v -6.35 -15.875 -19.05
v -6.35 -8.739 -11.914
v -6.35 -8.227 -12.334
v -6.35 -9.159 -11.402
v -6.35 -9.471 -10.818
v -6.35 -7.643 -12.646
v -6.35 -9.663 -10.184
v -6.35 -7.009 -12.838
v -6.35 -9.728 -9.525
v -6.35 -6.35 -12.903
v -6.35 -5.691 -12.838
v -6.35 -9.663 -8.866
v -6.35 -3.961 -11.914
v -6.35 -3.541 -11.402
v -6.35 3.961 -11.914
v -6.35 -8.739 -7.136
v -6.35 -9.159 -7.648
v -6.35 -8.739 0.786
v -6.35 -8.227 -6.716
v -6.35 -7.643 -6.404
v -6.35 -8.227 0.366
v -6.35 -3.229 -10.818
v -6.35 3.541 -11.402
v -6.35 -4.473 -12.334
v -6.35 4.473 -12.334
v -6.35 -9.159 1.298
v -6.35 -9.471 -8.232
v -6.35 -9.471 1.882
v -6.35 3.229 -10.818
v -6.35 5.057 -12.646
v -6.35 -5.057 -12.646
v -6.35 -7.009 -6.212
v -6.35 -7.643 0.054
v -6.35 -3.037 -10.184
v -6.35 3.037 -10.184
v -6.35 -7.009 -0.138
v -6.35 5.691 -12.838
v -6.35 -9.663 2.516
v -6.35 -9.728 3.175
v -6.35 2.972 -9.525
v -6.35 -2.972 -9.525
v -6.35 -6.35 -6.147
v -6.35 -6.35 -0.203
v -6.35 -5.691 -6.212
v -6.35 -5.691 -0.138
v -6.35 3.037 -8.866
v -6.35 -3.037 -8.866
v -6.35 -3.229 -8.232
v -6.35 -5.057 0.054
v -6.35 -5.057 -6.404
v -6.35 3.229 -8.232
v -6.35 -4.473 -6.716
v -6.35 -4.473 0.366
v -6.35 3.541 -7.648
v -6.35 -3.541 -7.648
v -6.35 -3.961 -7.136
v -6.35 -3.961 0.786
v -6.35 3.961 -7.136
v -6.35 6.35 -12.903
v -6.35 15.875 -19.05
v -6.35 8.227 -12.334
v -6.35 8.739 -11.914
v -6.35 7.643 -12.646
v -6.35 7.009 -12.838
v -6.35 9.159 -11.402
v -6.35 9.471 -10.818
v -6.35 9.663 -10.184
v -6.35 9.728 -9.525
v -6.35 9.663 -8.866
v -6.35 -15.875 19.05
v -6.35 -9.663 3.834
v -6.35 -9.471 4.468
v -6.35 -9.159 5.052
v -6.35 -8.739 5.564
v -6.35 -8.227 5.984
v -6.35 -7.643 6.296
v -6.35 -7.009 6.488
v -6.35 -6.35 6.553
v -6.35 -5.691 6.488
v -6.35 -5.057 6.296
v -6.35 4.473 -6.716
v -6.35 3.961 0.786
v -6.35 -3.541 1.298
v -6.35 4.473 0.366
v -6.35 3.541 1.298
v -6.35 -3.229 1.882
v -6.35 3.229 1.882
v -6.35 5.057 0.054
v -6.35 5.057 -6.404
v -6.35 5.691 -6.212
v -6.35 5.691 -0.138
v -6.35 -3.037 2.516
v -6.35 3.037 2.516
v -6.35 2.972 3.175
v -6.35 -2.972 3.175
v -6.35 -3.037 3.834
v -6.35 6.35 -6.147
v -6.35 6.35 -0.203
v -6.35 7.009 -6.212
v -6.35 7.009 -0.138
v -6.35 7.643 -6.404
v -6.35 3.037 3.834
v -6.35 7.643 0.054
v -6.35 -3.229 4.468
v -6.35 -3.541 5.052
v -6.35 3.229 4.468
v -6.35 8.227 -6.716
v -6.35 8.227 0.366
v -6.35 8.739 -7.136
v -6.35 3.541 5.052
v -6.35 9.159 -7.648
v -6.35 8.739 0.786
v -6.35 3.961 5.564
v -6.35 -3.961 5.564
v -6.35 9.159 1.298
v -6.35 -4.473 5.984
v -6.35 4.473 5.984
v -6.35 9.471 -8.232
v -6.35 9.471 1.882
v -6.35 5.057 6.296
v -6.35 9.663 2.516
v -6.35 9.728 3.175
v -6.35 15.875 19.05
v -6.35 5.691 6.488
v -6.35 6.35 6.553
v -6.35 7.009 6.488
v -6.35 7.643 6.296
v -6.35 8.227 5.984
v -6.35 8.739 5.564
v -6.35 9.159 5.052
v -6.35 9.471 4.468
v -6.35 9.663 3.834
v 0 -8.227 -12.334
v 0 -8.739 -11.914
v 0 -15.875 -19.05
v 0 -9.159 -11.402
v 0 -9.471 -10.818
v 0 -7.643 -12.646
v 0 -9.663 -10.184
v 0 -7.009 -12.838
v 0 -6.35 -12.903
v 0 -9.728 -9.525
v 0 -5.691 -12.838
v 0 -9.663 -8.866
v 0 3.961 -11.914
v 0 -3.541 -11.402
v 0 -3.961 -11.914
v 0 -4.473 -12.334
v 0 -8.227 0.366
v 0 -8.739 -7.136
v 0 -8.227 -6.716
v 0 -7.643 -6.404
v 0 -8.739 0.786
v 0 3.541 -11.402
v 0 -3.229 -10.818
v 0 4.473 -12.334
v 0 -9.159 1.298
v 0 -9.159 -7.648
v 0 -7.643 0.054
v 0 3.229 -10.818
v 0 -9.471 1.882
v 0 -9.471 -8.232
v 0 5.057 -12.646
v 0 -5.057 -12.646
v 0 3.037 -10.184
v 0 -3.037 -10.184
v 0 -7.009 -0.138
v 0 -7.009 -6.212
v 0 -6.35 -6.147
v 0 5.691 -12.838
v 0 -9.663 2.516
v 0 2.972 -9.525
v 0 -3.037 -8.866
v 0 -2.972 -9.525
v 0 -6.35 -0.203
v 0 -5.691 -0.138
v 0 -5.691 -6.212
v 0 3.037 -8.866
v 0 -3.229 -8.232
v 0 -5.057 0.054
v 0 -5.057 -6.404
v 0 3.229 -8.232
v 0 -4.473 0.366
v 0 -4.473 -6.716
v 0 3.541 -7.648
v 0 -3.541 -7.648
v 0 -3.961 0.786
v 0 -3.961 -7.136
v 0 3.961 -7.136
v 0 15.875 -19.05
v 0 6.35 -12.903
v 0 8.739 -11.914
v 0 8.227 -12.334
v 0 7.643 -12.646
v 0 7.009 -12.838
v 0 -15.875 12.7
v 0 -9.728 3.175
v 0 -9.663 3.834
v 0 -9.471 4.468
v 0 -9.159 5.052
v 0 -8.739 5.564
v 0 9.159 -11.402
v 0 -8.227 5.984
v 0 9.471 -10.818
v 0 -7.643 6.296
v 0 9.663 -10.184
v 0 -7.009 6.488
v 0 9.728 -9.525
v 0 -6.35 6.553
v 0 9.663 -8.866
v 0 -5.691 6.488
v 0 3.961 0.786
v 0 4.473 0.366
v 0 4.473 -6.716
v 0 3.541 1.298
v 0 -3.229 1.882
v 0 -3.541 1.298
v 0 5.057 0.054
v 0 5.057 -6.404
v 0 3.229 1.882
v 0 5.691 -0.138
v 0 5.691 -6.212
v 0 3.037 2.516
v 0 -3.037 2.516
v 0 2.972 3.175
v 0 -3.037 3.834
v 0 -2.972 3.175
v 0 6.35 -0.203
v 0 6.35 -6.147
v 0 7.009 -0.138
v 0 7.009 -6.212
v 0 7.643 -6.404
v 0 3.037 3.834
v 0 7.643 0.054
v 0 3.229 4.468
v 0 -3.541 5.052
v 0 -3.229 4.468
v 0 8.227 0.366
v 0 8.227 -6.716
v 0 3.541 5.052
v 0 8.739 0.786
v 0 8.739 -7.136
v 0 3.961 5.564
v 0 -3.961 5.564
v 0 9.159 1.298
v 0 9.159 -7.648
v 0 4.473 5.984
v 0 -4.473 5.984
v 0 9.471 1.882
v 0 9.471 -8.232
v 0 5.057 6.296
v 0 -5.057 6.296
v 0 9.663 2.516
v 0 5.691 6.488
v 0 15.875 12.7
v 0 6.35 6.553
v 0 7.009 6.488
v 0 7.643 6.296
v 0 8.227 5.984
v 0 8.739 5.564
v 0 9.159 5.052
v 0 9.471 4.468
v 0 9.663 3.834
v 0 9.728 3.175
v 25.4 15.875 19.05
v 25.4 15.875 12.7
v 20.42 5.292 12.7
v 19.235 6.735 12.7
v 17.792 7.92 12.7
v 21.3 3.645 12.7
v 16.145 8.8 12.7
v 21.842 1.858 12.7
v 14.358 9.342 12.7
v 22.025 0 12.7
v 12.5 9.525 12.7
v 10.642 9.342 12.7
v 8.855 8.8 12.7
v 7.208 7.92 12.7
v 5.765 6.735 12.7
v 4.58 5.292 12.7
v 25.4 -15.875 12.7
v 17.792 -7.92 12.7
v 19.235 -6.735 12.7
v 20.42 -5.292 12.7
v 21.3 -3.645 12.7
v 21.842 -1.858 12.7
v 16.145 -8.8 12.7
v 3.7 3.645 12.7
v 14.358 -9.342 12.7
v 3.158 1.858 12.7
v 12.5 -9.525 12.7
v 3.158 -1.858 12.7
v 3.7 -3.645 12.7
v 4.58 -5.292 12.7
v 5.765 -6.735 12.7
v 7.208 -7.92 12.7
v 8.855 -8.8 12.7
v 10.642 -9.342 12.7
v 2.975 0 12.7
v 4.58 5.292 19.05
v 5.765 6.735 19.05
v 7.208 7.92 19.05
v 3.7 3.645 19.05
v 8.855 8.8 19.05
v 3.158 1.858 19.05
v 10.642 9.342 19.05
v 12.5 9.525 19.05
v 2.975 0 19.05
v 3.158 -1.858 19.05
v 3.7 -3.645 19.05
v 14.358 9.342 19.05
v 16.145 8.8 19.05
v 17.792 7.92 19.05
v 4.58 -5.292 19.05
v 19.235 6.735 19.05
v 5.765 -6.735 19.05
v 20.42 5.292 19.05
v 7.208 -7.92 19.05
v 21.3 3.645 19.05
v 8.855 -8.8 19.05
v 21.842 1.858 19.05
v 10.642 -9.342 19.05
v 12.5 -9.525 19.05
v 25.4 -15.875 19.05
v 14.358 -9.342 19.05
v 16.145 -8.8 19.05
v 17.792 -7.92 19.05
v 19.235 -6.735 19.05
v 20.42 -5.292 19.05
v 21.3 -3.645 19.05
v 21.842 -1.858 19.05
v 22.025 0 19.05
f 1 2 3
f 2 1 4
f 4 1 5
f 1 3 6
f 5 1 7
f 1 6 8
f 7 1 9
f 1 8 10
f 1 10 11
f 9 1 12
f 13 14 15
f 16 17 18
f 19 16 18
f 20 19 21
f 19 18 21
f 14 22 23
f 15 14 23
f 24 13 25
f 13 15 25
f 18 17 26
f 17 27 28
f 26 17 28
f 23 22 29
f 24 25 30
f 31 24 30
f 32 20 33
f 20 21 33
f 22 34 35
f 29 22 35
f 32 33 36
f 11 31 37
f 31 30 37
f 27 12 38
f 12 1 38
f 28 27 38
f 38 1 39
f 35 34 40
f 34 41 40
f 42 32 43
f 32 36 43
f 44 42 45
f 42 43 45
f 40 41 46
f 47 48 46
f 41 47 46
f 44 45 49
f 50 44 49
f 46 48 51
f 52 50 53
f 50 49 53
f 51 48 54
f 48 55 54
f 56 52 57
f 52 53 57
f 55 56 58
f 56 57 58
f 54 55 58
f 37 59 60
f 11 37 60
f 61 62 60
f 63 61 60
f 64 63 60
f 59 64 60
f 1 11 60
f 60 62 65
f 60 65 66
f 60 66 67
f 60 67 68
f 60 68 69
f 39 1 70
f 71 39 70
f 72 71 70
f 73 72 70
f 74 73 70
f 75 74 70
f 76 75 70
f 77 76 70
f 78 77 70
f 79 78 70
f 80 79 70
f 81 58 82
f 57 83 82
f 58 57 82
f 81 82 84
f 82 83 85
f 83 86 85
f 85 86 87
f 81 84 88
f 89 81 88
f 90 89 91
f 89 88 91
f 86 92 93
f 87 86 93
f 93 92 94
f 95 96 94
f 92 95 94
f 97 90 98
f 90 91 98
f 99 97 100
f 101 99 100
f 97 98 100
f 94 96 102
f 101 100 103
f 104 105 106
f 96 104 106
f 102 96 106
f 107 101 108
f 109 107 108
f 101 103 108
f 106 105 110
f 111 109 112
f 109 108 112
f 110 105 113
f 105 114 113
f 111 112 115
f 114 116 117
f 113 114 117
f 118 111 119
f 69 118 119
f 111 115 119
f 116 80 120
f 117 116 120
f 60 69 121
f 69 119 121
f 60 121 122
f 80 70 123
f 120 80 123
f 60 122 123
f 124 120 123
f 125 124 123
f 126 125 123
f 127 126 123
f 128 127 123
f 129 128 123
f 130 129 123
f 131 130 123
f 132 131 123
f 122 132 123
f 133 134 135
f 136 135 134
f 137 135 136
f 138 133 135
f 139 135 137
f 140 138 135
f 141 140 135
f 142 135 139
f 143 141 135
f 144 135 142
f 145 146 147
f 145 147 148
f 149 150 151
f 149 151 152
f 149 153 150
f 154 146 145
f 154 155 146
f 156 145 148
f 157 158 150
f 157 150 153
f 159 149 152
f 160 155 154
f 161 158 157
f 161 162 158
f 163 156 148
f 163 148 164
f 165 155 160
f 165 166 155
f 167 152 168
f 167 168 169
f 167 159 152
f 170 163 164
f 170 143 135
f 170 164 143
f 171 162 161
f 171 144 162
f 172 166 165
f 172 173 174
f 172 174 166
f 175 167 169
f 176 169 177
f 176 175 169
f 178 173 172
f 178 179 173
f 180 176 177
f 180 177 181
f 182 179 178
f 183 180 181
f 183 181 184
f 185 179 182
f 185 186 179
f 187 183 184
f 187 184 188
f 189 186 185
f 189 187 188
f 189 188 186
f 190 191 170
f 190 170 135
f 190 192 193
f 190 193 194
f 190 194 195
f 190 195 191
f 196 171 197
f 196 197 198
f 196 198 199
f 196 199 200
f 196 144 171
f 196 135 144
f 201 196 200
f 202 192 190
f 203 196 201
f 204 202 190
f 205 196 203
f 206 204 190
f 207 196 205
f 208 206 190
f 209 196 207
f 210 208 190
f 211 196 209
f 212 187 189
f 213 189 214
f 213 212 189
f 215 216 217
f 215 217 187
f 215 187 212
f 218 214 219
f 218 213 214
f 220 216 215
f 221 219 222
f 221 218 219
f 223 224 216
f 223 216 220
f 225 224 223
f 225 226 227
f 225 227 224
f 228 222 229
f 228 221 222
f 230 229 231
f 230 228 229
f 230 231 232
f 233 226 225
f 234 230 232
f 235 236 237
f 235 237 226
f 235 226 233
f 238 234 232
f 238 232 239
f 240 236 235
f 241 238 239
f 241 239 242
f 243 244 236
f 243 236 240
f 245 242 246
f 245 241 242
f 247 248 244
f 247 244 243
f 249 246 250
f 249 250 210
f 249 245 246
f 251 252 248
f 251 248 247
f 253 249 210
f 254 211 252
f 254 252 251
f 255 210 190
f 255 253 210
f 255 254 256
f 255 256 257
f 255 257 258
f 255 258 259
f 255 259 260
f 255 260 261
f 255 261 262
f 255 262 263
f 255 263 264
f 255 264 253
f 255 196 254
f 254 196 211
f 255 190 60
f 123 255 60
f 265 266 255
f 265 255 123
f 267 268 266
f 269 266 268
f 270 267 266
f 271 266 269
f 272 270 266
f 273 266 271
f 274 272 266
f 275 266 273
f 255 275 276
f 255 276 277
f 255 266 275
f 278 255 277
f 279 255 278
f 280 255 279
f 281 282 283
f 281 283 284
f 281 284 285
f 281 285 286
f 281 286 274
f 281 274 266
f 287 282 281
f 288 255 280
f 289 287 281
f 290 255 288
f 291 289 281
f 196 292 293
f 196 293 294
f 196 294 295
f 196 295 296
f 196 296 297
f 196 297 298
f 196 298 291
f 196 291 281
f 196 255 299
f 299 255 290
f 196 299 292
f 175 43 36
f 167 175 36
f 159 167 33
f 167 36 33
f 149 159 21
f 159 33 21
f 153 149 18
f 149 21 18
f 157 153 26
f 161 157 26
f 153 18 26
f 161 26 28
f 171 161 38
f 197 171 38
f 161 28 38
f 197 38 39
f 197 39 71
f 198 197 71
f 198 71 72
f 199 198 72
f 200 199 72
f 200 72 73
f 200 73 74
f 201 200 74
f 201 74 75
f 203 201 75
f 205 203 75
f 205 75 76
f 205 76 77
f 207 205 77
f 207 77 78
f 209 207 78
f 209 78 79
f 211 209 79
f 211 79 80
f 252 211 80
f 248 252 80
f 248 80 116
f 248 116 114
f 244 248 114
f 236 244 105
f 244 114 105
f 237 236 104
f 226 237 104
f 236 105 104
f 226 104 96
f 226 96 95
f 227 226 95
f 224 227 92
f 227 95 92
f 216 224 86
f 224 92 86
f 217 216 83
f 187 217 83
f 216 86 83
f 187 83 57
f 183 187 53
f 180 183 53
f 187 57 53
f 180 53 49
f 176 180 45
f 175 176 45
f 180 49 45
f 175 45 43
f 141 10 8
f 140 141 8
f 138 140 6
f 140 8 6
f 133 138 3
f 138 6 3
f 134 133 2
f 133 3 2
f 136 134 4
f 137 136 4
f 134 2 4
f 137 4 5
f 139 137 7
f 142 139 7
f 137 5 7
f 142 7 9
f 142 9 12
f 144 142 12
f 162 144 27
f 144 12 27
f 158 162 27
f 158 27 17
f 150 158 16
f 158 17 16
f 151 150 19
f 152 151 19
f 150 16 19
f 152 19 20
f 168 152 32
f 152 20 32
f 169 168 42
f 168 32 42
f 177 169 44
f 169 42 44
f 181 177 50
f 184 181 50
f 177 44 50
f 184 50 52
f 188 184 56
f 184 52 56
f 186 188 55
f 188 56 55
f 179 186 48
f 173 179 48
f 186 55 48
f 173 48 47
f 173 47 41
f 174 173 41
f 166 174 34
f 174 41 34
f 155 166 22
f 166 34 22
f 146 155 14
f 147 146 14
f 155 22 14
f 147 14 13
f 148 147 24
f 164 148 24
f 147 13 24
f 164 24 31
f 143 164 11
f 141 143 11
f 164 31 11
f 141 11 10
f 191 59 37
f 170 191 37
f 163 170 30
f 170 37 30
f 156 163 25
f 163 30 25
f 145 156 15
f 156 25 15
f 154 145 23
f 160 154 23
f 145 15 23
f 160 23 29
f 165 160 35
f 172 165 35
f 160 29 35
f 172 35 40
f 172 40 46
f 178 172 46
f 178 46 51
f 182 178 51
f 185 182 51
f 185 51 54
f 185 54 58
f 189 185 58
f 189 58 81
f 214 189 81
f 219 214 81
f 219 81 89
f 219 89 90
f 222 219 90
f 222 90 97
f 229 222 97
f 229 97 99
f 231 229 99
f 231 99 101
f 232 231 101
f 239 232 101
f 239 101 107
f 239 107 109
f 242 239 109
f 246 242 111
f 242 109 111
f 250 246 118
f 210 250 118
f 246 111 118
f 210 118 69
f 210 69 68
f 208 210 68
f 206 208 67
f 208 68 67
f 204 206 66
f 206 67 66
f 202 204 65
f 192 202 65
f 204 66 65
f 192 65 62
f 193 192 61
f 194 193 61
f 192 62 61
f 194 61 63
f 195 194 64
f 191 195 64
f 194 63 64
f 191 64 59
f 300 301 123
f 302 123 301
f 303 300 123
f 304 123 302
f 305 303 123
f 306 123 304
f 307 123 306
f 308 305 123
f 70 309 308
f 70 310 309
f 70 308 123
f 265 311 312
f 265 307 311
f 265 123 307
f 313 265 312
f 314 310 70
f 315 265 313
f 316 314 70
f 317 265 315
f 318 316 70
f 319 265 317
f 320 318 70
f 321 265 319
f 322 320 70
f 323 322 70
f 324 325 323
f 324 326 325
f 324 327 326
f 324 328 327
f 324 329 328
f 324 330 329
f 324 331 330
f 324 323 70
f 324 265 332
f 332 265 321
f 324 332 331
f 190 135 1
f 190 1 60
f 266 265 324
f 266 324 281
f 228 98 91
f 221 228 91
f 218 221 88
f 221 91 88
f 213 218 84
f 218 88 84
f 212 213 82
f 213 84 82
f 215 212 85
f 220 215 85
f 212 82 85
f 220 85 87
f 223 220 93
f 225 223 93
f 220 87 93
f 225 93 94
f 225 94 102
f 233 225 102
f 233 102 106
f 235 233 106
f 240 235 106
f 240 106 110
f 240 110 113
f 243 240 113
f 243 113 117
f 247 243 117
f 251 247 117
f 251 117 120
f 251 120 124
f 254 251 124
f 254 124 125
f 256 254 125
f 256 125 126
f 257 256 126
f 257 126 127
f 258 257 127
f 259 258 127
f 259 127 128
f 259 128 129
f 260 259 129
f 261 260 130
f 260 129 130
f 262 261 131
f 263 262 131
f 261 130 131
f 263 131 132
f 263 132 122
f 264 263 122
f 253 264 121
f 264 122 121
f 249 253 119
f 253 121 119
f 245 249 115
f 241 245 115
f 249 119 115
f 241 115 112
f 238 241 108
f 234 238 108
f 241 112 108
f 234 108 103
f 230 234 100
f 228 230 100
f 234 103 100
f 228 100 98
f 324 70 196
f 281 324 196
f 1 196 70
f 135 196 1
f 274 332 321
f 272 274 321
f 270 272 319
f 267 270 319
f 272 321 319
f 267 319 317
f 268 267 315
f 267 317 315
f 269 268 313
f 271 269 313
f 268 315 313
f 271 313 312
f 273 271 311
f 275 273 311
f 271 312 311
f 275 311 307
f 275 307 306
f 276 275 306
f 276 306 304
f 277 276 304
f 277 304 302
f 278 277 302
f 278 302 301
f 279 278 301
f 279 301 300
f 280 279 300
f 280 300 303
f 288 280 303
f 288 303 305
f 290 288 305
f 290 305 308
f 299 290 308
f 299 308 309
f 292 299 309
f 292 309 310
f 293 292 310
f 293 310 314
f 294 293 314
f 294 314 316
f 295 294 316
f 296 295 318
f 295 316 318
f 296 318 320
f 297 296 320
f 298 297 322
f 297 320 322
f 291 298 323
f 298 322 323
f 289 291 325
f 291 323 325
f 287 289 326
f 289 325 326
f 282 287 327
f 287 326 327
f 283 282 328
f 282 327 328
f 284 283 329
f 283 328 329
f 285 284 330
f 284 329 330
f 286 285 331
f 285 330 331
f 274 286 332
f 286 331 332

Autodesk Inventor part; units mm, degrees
ref_plane "YZ Plane" through (0, 0, 0) normal (1, 0, 0) x (0, 1, 0)
ref_plane "XZ Plane" through (0, 0, 0) normal (0, 1, 0) x (-1, 0, 0)
ref_plane "XY Plane" through (0, 0, 0) normal (0, 0, 1) x (1, 0, 0)
sketch "Sketch1" plane through (0, 0, 0) normal (1, 0, 0) x (0, 1, 0)
  line L0 (-15.875, 19.05) -> (-15.875, -19.05)
  line L1 (-15.875, -19.05) -> (15.875, -19.05)
  line L2 (15.875, -19.05) -> (15.875, 19.05)
  line L3 (15.875, 19.05) -> (-15.875, 19.05)
  line L4 (-15.875, 19.05) -> (15.875, -19.05) construction
  line L5 (-15.875, -19.05) -> (15.875, 19.05) construction
  point P0 (0, 0)
  dimension "d0" = 31.75
  dimension "d1" = 38.1
extrude "Extrusion1" add sketch "Sketch1" against normal blind 6.35
sketch "Sketch2" plane through (0, 0, 0) normal (1, 0, 0) x (0, 0, -1)
  line L0 (-19.05, -15.875) -> (-19.05, 15.875) projected
  line L1 (19.05, -15.875) -> (-19.05, -15.875) projected
  line L2 (-19.05, 15.875) -> (-12.7, 15.875)
  line L3 (-12.7, 15.875) -> (-12.7, -15.875)
  line L4 (-12.7, -15.875) -> (-19.05, -15.875)
  line L5 (-19.05, -15.875) -> (-19.05, 15.875)
  point P0 (0, 0)
  dimension "d4" = 6.35
extrude "Extrusion2" add sketch "Sketch2" along normal blind 25.4
sketch "Sketch3" plane through (-6.35, -15.875, 19.05) normal (0, 0, 1) x (1, 0, 0)
  circle A0 centre (18.8501, 15.875) radius 9.525
  line L0 (0, 0) -> (0, 31.75) projected
  line L1 (31.75, 31.75) -> (31.75, 0) construction
  line L2 (31.75, 15.875) -> (0, 15.875) construction
  line L3 (0, 31.75) -> (0, 0) construction
  point P0 (6.35, 15.875)
  dimension "d7" = 18.8501
  dimension "d8" = 19.05
  dimension "d11" = 0
extrude "Extrusion3" cut sketch "Sketch3" against normal through all
sketch "Sketch4" plane through (0, 0, 0) normal (1, 0, 0) x (0, 0, -1)
  line L0 (9.525, 6.35) -> (-3.175, 6.35) construction
  line L1 (-3.175, 6.35) -> (-3.175, -6.35) construction
  line L2 (-3.175, -6.35) -> (9.525, -6.35) construction
  line L3 (9.525, -6.35) -> (9.525, 6.35) construction
  line L4 (19.05, 15.875) -> (-12.7, 15.875) projected
  line L5 (19.05, -15.875) -> (19.05, 15.875) projected
  line L6 (-12.7, -15.875) -> (-12.7, 15.875) projected
  line L7 (-12.7, -15.875) -> (19.05, -15.875) projected
  point P0 (0, 0)
  dimension "d12" = 9.525
  dimension "d13" = 9.525
  dimension "d14" = 9.525
  dimension "d15" = 9.525
hole "Hole1" at (0, 6.35, 3.175) at (0, 6.35, -9.525) at (0, -6.35, -9.525) at (0, -6.35, 3.175) direction (-1, 0, 0) diameter 6.7564 end through all clearance for "Hex Machine Screw" size "1/4" standard "Ansi Unified Screw Threads"
properties part number "sideSupport"
